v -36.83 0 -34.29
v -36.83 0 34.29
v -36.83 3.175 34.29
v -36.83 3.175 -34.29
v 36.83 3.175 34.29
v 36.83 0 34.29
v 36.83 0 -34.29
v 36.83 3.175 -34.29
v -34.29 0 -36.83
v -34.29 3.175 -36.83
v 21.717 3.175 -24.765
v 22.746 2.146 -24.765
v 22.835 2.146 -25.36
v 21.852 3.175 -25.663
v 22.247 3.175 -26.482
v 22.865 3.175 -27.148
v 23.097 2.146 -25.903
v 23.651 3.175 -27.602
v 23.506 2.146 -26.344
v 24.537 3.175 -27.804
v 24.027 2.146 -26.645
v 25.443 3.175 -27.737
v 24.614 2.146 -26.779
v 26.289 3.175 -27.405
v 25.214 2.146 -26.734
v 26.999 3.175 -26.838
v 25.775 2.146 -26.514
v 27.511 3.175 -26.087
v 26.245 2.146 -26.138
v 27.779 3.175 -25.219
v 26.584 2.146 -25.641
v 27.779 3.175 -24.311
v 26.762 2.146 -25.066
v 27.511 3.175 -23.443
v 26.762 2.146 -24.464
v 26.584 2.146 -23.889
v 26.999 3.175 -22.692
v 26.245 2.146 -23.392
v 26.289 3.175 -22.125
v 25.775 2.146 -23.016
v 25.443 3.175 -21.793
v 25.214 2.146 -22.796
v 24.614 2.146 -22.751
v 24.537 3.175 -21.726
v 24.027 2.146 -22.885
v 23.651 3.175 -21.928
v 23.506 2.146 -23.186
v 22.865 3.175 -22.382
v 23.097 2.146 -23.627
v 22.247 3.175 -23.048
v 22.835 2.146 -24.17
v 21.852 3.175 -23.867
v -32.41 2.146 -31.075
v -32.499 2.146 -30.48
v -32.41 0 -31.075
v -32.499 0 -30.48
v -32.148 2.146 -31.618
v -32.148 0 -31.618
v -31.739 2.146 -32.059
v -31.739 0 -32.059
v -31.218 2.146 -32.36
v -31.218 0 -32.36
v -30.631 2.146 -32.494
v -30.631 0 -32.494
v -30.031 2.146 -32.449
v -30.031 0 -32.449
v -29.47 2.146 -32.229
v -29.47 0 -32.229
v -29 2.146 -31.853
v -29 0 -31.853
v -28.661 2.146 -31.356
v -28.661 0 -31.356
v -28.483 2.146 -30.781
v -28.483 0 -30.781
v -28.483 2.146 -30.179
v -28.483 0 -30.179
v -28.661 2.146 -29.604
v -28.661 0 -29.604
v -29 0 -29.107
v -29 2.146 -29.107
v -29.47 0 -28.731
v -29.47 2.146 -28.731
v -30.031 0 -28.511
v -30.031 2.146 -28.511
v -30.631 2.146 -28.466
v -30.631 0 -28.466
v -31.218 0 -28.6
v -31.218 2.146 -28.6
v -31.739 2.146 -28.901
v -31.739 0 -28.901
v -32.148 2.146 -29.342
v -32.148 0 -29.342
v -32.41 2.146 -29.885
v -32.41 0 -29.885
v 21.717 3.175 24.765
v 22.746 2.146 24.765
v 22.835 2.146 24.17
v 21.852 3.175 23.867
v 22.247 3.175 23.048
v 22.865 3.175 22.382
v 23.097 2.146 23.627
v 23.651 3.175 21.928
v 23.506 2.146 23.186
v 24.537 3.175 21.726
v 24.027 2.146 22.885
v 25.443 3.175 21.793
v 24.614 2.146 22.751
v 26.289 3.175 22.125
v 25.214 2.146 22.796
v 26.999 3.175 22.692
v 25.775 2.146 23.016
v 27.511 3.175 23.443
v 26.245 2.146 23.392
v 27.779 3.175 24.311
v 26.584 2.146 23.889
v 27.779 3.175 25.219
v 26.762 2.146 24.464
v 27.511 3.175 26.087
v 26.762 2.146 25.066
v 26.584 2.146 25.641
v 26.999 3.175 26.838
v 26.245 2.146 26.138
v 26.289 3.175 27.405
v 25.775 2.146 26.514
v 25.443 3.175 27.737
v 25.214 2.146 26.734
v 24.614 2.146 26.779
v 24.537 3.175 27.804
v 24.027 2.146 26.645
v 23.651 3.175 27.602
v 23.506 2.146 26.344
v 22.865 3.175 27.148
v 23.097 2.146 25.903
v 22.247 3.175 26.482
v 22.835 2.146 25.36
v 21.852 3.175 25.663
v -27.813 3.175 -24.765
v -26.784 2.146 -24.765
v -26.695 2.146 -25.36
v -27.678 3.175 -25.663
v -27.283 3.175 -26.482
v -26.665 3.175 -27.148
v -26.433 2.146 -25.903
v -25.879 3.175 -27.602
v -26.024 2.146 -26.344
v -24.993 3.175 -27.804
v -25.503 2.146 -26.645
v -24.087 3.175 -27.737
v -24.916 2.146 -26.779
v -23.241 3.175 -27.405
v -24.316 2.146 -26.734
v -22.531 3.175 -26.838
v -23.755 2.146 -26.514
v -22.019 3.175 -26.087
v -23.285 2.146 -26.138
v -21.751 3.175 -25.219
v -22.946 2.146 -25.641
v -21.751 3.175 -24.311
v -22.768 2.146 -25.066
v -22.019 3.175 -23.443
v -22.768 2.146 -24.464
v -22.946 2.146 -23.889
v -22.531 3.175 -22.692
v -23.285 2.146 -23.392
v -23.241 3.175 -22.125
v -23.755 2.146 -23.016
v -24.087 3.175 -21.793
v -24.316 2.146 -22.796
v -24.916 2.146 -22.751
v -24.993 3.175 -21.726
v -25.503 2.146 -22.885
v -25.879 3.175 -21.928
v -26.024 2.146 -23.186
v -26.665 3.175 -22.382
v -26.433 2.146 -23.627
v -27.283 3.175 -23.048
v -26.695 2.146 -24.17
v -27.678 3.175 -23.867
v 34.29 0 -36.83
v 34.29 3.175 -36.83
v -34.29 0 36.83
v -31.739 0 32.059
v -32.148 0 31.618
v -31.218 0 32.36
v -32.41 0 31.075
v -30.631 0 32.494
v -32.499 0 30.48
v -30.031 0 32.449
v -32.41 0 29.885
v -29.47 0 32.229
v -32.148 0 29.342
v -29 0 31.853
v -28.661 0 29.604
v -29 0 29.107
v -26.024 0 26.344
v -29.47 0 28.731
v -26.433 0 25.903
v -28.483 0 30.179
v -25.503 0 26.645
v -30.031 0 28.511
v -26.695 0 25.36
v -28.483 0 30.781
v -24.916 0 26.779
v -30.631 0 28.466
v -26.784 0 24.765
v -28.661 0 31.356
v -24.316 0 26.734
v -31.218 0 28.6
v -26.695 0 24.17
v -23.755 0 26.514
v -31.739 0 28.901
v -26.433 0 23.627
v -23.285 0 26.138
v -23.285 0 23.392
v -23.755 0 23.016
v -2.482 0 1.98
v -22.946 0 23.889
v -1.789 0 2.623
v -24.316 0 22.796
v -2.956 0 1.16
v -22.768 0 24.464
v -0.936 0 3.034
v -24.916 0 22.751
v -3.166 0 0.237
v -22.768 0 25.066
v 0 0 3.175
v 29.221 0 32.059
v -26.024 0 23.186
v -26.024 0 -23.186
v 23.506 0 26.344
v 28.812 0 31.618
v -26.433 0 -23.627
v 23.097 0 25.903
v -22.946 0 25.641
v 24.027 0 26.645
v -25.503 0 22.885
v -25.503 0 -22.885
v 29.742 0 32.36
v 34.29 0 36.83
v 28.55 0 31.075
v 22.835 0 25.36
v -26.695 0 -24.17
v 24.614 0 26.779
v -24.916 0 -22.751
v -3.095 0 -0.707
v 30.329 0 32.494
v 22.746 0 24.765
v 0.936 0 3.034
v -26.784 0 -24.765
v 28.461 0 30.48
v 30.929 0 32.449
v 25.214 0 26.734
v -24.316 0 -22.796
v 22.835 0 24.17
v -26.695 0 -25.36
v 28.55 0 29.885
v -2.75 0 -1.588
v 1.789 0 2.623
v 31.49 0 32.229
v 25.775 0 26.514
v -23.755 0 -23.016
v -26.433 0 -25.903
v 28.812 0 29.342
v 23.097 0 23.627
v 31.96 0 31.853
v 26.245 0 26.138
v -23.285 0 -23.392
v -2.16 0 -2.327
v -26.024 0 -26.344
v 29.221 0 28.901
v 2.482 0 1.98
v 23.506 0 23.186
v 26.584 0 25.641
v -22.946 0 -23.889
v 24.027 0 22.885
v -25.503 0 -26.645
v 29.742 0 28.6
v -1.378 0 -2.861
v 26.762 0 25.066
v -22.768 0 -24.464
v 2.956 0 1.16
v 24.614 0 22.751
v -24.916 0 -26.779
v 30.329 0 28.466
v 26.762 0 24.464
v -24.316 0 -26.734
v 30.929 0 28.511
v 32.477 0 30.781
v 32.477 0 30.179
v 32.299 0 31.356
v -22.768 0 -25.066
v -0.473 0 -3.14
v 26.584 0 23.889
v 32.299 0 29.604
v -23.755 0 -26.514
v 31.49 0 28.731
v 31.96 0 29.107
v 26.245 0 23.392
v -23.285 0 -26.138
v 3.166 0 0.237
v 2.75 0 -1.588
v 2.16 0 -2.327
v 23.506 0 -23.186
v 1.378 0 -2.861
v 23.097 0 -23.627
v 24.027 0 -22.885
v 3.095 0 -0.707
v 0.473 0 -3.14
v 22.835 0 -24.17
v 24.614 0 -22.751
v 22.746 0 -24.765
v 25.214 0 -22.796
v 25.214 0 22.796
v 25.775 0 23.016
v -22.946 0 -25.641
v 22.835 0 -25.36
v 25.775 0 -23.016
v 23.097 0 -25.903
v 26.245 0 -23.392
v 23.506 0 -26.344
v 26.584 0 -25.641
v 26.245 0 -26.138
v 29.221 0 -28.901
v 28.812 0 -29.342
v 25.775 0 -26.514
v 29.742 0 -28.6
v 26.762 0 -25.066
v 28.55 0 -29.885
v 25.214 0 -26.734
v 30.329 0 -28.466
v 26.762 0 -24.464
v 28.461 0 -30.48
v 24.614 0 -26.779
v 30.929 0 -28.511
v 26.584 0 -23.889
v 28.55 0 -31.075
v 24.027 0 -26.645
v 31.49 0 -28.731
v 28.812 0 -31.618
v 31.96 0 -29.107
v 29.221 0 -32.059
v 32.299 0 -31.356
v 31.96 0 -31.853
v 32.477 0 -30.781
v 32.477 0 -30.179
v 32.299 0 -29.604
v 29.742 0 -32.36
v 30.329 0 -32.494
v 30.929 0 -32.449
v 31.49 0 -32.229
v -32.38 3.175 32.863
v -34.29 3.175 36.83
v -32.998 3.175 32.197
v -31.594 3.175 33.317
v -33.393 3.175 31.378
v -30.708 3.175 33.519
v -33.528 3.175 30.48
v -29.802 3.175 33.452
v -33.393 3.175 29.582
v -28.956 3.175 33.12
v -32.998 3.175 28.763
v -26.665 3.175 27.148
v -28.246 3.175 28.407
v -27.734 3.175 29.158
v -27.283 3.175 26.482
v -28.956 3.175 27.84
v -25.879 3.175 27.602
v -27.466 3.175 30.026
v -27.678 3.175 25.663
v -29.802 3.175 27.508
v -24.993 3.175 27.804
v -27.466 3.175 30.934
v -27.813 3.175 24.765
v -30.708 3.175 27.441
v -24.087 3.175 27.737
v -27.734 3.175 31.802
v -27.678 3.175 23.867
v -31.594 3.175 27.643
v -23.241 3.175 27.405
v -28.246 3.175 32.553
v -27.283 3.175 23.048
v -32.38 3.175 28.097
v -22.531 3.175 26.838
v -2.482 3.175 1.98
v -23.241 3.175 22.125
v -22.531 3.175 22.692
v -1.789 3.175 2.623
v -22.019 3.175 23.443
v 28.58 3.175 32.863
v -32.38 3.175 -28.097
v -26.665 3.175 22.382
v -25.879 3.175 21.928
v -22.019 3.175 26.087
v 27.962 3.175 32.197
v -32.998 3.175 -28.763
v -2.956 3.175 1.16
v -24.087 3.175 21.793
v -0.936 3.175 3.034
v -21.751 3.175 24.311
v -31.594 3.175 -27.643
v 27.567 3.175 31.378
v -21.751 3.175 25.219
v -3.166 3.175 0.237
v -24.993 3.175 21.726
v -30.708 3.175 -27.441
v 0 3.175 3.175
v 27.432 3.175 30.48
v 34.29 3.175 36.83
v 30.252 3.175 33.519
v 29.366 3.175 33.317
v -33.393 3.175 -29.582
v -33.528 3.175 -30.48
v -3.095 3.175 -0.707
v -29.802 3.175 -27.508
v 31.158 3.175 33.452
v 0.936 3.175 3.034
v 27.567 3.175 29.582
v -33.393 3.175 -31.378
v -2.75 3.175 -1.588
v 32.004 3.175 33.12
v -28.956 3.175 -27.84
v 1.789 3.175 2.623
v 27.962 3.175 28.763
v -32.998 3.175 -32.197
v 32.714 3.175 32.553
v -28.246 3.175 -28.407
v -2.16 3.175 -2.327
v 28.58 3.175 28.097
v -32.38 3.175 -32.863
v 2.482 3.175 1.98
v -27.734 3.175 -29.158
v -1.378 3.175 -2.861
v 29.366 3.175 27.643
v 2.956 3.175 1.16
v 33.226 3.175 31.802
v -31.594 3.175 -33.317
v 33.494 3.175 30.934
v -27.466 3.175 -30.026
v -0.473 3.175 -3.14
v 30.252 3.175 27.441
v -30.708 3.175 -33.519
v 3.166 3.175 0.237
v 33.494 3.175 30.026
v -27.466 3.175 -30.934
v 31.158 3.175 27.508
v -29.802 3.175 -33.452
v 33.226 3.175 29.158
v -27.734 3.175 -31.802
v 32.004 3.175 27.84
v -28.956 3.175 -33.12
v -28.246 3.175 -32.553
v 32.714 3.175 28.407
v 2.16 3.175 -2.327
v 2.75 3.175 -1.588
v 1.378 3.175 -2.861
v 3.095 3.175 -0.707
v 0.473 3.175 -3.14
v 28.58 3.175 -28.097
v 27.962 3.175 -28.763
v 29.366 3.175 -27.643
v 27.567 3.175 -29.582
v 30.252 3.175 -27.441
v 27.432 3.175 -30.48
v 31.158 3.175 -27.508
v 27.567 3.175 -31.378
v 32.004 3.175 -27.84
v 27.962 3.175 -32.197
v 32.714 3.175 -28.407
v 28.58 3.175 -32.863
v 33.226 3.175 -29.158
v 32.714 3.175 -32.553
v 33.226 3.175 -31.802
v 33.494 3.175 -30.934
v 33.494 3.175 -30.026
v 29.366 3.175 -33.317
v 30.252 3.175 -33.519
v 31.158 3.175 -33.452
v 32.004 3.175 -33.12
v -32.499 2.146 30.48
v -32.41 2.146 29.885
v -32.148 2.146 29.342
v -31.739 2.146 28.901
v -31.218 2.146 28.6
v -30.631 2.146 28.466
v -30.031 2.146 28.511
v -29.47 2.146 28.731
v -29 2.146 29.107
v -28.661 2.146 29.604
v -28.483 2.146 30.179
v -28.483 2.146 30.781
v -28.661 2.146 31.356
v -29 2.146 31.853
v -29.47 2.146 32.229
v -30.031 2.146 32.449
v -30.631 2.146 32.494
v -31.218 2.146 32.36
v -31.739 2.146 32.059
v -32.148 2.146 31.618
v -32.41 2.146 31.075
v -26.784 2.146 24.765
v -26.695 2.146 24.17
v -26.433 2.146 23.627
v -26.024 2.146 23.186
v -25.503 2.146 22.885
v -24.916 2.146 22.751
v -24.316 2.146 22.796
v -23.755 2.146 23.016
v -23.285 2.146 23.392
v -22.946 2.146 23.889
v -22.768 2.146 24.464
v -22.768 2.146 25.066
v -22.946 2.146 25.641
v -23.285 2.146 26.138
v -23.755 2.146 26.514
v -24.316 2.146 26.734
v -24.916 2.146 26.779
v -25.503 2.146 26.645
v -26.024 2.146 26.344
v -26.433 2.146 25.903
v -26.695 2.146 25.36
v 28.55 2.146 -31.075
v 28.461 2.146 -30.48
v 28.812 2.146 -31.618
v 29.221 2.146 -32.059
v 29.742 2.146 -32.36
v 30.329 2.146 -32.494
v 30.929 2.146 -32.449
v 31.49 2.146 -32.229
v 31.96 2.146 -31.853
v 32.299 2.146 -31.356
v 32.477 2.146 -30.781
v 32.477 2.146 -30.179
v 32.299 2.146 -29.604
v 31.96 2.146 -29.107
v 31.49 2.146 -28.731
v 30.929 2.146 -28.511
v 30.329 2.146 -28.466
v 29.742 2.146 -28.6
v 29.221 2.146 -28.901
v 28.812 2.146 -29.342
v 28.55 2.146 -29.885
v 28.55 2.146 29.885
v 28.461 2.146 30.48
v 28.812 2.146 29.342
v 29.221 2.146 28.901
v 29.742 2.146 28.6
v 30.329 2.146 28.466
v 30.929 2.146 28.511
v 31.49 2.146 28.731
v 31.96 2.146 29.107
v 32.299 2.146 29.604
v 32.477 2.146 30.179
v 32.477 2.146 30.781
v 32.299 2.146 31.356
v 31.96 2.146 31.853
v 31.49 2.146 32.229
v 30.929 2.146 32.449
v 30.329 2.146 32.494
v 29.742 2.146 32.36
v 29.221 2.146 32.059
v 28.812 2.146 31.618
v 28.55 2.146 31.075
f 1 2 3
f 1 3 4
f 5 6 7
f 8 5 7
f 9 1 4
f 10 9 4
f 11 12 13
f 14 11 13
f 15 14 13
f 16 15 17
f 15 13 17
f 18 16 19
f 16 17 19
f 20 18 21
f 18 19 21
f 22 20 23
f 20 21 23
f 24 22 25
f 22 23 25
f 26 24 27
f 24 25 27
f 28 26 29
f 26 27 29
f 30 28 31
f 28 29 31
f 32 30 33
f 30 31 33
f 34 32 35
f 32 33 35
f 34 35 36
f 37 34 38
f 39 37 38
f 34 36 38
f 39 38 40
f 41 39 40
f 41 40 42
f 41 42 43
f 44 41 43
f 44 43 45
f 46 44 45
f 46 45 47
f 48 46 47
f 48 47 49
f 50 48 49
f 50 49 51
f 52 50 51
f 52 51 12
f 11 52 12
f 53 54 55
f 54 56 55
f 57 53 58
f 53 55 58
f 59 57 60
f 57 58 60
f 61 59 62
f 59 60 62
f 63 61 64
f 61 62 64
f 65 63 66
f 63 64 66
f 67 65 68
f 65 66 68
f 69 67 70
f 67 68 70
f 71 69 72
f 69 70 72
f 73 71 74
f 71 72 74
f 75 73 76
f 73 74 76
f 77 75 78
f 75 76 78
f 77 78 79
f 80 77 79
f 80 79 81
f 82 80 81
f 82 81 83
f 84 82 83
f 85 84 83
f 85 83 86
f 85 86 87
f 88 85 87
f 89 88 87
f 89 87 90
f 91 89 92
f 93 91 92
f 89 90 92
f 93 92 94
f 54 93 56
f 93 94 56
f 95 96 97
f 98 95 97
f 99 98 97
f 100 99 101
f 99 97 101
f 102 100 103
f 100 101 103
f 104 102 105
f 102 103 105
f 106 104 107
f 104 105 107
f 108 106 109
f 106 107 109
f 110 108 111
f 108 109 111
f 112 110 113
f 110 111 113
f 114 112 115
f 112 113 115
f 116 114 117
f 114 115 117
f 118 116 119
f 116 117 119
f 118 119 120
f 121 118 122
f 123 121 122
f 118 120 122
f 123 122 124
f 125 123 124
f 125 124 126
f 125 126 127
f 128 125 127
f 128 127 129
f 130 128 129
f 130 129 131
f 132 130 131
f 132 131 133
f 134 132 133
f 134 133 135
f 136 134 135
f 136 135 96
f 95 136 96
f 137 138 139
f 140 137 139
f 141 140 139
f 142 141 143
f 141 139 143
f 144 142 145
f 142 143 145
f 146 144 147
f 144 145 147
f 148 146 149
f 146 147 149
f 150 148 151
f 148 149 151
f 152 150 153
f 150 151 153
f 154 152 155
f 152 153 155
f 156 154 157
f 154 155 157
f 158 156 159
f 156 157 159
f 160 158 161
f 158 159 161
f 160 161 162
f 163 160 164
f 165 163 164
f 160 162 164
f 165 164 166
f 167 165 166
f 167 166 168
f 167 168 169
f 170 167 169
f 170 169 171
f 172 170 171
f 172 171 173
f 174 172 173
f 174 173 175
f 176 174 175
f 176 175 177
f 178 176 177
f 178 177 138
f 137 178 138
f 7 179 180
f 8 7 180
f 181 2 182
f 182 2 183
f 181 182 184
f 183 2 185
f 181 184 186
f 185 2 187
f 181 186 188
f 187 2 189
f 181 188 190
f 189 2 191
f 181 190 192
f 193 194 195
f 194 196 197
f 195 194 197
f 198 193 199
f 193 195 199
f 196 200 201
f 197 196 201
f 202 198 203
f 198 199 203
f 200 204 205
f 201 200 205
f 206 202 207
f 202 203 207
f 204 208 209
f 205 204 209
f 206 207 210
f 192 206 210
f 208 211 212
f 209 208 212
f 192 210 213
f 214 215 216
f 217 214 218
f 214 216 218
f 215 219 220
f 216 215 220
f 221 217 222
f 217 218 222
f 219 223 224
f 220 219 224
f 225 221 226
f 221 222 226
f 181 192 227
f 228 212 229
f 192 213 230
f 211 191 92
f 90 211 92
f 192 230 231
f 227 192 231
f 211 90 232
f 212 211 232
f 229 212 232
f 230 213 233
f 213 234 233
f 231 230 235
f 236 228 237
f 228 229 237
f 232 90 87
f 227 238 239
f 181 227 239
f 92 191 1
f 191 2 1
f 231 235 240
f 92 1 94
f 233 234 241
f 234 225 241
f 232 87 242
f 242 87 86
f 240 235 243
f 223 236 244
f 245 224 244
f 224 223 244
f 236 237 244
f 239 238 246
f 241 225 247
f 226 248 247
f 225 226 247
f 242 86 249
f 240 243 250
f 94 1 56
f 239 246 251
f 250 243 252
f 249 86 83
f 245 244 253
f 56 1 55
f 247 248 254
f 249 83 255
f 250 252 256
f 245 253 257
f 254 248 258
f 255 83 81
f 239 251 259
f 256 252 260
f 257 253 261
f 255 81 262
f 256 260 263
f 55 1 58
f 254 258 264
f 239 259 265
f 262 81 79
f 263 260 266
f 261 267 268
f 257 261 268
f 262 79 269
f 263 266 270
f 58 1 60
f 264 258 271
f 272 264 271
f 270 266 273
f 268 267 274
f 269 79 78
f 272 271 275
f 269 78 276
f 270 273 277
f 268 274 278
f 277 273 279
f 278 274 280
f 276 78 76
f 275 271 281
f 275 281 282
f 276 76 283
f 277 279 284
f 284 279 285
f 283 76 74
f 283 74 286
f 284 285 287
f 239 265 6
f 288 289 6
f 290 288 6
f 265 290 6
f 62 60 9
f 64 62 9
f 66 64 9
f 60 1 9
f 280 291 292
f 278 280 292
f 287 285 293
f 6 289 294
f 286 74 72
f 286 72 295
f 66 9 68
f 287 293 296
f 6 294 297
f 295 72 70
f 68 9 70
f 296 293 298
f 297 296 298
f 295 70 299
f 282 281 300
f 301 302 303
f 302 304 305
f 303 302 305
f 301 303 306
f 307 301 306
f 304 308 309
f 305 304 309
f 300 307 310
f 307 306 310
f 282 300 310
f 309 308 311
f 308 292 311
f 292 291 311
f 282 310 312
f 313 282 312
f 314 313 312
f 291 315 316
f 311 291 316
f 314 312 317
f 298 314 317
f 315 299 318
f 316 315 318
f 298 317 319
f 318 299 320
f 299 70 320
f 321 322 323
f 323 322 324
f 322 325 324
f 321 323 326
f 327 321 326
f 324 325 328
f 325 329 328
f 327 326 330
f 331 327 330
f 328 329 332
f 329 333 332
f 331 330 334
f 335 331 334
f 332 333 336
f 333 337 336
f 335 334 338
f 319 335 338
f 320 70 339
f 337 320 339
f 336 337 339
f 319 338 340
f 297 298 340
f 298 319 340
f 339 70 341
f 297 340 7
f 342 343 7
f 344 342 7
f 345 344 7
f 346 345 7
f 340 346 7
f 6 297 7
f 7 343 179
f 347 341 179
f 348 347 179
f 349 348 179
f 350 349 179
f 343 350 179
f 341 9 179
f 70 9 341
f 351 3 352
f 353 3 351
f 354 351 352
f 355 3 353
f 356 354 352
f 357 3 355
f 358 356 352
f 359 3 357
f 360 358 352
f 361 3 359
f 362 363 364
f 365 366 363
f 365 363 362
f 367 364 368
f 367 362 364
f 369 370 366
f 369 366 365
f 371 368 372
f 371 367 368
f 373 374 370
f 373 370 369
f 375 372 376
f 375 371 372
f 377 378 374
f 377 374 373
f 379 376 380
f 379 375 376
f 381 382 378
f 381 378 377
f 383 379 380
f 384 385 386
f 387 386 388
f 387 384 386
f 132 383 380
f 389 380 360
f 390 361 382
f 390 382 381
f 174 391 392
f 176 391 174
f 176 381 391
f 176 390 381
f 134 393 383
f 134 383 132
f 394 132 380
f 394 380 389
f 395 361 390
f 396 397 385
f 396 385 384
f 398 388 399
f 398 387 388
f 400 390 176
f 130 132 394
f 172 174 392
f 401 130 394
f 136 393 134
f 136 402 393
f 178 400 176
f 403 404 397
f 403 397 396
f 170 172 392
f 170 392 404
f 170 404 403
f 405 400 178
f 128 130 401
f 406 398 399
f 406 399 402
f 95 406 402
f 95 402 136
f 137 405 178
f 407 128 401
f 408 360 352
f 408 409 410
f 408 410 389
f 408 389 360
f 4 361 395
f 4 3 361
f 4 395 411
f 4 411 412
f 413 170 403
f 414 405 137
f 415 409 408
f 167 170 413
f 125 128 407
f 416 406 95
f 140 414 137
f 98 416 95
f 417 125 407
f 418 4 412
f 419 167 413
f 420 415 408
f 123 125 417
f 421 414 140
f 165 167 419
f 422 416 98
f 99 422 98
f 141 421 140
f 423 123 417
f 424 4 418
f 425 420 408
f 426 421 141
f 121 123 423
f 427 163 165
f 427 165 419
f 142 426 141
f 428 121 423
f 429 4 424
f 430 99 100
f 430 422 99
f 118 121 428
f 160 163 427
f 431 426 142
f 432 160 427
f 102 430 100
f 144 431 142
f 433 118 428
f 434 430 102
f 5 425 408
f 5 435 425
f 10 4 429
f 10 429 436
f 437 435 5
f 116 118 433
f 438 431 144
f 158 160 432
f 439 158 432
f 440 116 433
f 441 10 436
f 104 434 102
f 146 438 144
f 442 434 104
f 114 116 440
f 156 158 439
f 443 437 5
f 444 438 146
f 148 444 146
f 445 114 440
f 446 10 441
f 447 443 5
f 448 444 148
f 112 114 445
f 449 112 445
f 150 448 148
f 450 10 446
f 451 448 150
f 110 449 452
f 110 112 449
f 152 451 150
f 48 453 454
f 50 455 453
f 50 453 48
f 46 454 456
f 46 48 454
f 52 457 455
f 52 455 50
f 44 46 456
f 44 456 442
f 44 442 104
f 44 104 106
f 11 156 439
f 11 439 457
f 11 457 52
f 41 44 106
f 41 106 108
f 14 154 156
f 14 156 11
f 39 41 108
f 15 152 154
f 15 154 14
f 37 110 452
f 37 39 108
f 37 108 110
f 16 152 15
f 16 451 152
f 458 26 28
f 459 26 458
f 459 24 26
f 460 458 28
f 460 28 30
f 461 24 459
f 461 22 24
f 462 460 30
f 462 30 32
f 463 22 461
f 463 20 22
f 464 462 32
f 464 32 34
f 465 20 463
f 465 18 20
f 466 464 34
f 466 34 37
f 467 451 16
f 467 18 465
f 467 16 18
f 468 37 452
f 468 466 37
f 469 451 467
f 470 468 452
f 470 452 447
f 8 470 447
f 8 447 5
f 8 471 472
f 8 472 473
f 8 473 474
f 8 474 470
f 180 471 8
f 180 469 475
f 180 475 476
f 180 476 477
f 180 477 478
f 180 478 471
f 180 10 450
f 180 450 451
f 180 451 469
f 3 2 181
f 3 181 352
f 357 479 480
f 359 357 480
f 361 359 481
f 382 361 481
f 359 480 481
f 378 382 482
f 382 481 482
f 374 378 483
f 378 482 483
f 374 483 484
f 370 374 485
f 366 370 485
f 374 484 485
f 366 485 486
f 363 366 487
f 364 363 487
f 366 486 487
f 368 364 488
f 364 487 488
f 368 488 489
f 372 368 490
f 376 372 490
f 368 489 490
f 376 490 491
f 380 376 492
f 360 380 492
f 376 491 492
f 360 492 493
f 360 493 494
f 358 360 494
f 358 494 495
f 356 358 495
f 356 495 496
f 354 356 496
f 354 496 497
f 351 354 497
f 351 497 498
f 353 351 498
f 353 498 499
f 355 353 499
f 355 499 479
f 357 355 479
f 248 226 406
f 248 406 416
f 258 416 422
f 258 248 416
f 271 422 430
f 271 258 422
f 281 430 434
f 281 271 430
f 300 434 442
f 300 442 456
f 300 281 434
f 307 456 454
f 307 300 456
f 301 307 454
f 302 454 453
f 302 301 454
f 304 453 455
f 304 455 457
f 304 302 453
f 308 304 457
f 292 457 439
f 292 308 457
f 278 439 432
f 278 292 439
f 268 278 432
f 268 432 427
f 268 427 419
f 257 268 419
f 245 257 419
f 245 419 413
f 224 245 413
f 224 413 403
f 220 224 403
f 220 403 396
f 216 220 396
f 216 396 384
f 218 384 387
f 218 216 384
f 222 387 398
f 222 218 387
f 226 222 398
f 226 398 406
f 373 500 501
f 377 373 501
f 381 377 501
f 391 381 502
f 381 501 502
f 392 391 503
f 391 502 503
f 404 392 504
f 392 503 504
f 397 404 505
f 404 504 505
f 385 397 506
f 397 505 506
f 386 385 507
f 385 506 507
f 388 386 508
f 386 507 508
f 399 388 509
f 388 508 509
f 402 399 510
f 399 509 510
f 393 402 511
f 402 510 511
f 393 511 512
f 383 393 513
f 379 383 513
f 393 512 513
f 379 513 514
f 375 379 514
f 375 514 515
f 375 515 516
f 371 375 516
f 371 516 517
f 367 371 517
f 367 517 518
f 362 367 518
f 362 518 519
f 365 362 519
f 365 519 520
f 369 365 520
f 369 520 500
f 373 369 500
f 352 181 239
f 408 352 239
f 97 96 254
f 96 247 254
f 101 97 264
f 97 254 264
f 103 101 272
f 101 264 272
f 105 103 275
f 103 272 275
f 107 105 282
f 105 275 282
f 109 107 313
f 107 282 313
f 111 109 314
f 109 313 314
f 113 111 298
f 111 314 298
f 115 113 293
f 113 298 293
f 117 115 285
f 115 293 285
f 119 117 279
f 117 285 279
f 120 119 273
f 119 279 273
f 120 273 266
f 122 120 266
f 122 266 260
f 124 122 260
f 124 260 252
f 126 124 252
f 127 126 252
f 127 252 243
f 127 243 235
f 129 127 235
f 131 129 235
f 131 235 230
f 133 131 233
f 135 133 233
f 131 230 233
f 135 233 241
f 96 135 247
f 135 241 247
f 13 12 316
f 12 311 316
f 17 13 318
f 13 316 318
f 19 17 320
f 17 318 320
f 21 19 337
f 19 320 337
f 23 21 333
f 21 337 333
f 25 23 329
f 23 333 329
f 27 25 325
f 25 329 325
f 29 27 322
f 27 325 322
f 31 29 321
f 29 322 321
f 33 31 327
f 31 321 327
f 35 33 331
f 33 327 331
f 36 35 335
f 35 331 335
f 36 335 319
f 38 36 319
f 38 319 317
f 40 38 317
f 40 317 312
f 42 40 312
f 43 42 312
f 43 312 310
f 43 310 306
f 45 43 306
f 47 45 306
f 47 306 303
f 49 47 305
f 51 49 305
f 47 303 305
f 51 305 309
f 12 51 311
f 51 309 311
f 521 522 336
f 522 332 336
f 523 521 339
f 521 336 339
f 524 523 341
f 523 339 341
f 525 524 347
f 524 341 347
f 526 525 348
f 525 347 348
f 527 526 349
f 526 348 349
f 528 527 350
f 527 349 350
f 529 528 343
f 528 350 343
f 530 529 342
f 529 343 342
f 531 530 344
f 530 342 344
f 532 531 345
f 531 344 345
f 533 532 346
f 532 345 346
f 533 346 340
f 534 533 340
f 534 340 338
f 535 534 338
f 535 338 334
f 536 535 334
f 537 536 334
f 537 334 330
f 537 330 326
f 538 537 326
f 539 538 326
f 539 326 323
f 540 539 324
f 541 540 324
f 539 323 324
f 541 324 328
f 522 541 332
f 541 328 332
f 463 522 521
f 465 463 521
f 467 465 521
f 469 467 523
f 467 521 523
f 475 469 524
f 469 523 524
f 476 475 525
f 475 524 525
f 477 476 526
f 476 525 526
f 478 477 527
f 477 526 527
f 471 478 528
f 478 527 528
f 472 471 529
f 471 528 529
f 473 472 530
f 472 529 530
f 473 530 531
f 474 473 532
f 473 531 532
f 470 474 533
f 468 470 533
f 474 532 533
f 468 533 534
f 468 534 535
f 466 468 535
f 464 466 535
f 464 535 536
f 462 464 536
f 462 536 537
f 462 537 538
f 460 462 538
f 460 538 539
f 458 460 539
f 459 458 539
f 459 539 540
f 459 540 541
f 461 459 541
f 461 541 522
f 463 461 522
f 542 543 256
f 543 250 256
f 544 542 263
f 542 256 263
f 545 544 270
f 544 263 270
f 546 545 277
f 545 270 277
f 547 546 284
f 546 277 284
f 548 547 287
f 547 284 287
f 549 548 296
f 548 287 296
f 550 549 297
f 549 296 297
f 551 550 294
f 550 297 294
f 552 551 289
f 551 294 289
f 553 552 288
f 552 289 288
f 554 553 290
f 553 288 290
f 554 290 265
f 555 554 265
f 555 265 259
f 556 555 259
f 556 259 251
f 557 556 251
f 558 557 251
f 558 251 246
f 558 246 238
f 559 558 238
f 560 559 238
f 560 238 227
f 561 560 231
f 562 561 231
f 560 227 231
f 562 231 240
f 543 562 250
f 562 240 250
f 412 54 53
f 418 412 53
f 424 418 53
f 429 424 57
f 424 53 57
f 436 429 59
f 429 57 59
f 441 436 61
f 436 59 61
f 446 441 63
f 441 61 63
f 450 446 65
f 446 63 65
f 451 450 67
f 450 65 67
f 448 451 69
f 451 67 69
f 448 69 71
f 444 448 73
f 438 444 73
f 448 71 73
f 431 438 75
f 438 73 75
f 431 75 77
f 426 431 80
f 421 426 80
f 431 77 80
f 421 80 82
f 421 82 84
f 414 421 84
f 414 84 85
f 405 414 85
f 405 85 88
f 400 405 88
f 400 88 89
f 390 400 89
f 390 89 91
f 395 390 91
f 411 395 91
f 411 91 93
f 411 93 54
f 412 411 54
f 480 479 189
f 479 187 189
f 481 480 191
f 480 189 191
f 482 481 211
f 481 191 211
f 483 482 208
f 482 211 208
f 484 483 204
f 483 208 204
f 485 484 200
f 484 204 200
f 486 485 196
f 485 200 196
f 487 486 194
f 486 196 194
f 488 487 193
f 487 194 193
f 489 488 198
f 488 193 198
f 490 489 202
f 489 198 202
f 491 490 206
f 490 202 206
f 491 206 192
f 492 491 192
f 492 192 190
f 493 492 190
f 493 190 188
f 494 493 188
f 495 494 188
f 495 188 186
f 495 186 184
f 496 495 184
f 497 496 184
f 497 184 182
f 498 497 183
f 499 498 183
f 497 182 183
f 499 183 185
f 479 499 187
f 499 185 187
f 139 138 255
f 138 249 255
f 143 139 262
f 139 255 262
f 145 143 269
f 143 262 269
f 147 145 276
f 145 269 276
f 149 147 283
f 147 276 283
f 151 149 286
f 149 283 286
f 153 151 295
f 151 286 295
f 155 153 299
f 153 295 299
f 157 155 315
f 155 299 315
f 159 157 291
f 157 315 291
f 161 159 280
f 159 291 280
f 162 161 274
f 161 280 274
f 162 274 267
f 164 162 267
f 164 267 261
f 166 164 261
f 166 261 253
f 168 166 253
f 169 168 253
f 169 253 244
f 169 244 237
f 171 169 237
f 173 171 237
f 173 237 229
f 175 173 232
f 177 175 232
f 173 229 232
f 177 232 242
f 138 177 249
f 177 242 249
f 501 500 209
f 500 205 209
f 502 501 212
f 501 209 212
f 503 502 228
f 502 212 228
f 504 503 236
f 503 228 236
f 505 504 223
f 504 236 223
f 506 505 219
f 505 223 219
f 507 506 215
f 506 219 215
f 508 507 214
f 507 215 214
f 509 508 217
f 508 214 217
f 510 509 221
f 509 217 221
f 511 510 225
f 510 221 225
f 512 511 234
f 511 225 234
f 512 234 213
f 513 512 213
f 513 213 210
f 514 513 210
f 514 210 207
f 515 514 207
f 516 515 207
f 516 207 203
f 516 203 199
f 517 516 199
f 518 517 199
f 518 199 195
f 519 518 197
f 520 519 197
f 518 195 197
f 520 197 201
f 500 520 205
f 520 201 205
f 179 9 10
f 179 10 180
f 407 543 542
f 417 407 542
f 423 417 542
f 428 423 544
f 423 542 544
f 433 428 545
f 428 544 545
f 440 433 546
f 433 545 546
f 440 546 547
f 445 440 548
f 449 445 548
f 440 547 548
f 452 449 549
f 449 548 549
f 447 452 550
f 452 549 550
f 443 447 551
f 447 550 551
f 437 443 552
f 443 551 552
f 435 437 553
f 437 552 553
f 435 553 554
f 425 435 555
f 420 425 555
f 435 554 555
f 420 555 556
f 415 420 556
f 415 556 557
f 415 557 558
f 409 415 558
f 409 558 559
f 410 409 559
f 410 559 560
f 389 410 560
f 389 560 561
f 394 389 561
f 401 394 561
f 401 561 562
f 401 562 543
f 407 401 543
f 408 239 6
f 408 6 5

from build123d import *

# Parameters (mm, degrees)
SKETCH1_W                        = 73.66
SKETCH1_H                        = 73.66
SKETCH1_R                        = 3.175
BOSS_EXTRUDE1_DEPTH              = 3.175
CHAMFER2_SIZE                    = 2.54
F_10_32_TAPPED_HOLE1_D           = 4.0386
F_10_32_TAPPED_HOLE1_CSINK_D     = 6.096
F_10_32_TAPPED_HOLE1_CSINK_ANGLE = 90
F_10_32_TAPPED_HOLE2_D           = 4.0386
F_10_32_TAPPED_HOLE2_CSINK_D     = 6.096
F_10_32_TAPPED_HOLE2_CSINK_ANGLE = 90


with BuildPart() as part:
    # Sketch1 → Boss-Extrude1 (new body)
    with BuildSketch(Plane(origin=(0, 0, 0), x_dir=(1, 0, 0), z_dir=(0, 1, 0))):
        Rectangle(SKETCH1_W, SKETCH1_H)
        with Locations(Location((0, 0, 0), (0, 0, 270))):
            Circle(SKETCH1_R, mode=Mode.SUBTRACT)
    extrude(amount=BOSS_EXTRUDE1_DEPTH)

    # Chamfer2
    chamfer2_edges = [part.edges().sort_by_distance(p)[0] for p in [
        (-36.83, 1.5875, -36.83),
        (36.83, 1.5875, -36.83),
        (36.83, 1.5875, 36.83),
        (-36.83, 1.5875, 36.83),
    ]]
    chamfer(chamfer2_edges, length=CHAMFER2_SIZE)

    # #10-32 Tapped Hole1 (through all)
    with Locations(Plane(origin=(0, 3.175, 0), x_dir=(1, 0, 0), z_dir=(0, 1, 0))):
        with Locations((30.48, 30.48), (-30.48, 30.48), (-30.48, -30.48), (30.48, -30.48)):
            CounterSinkHole(F_10_32_TAPPED_HOLE1_D / 2, F_10_32_TAPPED_HOLE1_CSINK_D / 2, counter_sink_angle=F_10_32_TAPPED_HOLE1_CSINK_ANGLE)

    # #10-32 Tapped Hole2 (through all)
    with Locations(Plane(origin=(0, 3.175, 0), x_dir=(1, 0, 0), z_dir=(0, 1, 0))):
        with Locations((-24.765, 24.765), (24.765, 24.765), (-24.765, -24.765), (24.765, -24.765)):
            CounterSinkHole(F_10_32_TAPPED_HOLE2_D / 2, F_10_32_TAPPED_HOLE2_CSINK_D / 2, counter_sink_angle=F_10_32_TAPPED_HOLE2_CSINK_ANGLE)


solid = part.part
